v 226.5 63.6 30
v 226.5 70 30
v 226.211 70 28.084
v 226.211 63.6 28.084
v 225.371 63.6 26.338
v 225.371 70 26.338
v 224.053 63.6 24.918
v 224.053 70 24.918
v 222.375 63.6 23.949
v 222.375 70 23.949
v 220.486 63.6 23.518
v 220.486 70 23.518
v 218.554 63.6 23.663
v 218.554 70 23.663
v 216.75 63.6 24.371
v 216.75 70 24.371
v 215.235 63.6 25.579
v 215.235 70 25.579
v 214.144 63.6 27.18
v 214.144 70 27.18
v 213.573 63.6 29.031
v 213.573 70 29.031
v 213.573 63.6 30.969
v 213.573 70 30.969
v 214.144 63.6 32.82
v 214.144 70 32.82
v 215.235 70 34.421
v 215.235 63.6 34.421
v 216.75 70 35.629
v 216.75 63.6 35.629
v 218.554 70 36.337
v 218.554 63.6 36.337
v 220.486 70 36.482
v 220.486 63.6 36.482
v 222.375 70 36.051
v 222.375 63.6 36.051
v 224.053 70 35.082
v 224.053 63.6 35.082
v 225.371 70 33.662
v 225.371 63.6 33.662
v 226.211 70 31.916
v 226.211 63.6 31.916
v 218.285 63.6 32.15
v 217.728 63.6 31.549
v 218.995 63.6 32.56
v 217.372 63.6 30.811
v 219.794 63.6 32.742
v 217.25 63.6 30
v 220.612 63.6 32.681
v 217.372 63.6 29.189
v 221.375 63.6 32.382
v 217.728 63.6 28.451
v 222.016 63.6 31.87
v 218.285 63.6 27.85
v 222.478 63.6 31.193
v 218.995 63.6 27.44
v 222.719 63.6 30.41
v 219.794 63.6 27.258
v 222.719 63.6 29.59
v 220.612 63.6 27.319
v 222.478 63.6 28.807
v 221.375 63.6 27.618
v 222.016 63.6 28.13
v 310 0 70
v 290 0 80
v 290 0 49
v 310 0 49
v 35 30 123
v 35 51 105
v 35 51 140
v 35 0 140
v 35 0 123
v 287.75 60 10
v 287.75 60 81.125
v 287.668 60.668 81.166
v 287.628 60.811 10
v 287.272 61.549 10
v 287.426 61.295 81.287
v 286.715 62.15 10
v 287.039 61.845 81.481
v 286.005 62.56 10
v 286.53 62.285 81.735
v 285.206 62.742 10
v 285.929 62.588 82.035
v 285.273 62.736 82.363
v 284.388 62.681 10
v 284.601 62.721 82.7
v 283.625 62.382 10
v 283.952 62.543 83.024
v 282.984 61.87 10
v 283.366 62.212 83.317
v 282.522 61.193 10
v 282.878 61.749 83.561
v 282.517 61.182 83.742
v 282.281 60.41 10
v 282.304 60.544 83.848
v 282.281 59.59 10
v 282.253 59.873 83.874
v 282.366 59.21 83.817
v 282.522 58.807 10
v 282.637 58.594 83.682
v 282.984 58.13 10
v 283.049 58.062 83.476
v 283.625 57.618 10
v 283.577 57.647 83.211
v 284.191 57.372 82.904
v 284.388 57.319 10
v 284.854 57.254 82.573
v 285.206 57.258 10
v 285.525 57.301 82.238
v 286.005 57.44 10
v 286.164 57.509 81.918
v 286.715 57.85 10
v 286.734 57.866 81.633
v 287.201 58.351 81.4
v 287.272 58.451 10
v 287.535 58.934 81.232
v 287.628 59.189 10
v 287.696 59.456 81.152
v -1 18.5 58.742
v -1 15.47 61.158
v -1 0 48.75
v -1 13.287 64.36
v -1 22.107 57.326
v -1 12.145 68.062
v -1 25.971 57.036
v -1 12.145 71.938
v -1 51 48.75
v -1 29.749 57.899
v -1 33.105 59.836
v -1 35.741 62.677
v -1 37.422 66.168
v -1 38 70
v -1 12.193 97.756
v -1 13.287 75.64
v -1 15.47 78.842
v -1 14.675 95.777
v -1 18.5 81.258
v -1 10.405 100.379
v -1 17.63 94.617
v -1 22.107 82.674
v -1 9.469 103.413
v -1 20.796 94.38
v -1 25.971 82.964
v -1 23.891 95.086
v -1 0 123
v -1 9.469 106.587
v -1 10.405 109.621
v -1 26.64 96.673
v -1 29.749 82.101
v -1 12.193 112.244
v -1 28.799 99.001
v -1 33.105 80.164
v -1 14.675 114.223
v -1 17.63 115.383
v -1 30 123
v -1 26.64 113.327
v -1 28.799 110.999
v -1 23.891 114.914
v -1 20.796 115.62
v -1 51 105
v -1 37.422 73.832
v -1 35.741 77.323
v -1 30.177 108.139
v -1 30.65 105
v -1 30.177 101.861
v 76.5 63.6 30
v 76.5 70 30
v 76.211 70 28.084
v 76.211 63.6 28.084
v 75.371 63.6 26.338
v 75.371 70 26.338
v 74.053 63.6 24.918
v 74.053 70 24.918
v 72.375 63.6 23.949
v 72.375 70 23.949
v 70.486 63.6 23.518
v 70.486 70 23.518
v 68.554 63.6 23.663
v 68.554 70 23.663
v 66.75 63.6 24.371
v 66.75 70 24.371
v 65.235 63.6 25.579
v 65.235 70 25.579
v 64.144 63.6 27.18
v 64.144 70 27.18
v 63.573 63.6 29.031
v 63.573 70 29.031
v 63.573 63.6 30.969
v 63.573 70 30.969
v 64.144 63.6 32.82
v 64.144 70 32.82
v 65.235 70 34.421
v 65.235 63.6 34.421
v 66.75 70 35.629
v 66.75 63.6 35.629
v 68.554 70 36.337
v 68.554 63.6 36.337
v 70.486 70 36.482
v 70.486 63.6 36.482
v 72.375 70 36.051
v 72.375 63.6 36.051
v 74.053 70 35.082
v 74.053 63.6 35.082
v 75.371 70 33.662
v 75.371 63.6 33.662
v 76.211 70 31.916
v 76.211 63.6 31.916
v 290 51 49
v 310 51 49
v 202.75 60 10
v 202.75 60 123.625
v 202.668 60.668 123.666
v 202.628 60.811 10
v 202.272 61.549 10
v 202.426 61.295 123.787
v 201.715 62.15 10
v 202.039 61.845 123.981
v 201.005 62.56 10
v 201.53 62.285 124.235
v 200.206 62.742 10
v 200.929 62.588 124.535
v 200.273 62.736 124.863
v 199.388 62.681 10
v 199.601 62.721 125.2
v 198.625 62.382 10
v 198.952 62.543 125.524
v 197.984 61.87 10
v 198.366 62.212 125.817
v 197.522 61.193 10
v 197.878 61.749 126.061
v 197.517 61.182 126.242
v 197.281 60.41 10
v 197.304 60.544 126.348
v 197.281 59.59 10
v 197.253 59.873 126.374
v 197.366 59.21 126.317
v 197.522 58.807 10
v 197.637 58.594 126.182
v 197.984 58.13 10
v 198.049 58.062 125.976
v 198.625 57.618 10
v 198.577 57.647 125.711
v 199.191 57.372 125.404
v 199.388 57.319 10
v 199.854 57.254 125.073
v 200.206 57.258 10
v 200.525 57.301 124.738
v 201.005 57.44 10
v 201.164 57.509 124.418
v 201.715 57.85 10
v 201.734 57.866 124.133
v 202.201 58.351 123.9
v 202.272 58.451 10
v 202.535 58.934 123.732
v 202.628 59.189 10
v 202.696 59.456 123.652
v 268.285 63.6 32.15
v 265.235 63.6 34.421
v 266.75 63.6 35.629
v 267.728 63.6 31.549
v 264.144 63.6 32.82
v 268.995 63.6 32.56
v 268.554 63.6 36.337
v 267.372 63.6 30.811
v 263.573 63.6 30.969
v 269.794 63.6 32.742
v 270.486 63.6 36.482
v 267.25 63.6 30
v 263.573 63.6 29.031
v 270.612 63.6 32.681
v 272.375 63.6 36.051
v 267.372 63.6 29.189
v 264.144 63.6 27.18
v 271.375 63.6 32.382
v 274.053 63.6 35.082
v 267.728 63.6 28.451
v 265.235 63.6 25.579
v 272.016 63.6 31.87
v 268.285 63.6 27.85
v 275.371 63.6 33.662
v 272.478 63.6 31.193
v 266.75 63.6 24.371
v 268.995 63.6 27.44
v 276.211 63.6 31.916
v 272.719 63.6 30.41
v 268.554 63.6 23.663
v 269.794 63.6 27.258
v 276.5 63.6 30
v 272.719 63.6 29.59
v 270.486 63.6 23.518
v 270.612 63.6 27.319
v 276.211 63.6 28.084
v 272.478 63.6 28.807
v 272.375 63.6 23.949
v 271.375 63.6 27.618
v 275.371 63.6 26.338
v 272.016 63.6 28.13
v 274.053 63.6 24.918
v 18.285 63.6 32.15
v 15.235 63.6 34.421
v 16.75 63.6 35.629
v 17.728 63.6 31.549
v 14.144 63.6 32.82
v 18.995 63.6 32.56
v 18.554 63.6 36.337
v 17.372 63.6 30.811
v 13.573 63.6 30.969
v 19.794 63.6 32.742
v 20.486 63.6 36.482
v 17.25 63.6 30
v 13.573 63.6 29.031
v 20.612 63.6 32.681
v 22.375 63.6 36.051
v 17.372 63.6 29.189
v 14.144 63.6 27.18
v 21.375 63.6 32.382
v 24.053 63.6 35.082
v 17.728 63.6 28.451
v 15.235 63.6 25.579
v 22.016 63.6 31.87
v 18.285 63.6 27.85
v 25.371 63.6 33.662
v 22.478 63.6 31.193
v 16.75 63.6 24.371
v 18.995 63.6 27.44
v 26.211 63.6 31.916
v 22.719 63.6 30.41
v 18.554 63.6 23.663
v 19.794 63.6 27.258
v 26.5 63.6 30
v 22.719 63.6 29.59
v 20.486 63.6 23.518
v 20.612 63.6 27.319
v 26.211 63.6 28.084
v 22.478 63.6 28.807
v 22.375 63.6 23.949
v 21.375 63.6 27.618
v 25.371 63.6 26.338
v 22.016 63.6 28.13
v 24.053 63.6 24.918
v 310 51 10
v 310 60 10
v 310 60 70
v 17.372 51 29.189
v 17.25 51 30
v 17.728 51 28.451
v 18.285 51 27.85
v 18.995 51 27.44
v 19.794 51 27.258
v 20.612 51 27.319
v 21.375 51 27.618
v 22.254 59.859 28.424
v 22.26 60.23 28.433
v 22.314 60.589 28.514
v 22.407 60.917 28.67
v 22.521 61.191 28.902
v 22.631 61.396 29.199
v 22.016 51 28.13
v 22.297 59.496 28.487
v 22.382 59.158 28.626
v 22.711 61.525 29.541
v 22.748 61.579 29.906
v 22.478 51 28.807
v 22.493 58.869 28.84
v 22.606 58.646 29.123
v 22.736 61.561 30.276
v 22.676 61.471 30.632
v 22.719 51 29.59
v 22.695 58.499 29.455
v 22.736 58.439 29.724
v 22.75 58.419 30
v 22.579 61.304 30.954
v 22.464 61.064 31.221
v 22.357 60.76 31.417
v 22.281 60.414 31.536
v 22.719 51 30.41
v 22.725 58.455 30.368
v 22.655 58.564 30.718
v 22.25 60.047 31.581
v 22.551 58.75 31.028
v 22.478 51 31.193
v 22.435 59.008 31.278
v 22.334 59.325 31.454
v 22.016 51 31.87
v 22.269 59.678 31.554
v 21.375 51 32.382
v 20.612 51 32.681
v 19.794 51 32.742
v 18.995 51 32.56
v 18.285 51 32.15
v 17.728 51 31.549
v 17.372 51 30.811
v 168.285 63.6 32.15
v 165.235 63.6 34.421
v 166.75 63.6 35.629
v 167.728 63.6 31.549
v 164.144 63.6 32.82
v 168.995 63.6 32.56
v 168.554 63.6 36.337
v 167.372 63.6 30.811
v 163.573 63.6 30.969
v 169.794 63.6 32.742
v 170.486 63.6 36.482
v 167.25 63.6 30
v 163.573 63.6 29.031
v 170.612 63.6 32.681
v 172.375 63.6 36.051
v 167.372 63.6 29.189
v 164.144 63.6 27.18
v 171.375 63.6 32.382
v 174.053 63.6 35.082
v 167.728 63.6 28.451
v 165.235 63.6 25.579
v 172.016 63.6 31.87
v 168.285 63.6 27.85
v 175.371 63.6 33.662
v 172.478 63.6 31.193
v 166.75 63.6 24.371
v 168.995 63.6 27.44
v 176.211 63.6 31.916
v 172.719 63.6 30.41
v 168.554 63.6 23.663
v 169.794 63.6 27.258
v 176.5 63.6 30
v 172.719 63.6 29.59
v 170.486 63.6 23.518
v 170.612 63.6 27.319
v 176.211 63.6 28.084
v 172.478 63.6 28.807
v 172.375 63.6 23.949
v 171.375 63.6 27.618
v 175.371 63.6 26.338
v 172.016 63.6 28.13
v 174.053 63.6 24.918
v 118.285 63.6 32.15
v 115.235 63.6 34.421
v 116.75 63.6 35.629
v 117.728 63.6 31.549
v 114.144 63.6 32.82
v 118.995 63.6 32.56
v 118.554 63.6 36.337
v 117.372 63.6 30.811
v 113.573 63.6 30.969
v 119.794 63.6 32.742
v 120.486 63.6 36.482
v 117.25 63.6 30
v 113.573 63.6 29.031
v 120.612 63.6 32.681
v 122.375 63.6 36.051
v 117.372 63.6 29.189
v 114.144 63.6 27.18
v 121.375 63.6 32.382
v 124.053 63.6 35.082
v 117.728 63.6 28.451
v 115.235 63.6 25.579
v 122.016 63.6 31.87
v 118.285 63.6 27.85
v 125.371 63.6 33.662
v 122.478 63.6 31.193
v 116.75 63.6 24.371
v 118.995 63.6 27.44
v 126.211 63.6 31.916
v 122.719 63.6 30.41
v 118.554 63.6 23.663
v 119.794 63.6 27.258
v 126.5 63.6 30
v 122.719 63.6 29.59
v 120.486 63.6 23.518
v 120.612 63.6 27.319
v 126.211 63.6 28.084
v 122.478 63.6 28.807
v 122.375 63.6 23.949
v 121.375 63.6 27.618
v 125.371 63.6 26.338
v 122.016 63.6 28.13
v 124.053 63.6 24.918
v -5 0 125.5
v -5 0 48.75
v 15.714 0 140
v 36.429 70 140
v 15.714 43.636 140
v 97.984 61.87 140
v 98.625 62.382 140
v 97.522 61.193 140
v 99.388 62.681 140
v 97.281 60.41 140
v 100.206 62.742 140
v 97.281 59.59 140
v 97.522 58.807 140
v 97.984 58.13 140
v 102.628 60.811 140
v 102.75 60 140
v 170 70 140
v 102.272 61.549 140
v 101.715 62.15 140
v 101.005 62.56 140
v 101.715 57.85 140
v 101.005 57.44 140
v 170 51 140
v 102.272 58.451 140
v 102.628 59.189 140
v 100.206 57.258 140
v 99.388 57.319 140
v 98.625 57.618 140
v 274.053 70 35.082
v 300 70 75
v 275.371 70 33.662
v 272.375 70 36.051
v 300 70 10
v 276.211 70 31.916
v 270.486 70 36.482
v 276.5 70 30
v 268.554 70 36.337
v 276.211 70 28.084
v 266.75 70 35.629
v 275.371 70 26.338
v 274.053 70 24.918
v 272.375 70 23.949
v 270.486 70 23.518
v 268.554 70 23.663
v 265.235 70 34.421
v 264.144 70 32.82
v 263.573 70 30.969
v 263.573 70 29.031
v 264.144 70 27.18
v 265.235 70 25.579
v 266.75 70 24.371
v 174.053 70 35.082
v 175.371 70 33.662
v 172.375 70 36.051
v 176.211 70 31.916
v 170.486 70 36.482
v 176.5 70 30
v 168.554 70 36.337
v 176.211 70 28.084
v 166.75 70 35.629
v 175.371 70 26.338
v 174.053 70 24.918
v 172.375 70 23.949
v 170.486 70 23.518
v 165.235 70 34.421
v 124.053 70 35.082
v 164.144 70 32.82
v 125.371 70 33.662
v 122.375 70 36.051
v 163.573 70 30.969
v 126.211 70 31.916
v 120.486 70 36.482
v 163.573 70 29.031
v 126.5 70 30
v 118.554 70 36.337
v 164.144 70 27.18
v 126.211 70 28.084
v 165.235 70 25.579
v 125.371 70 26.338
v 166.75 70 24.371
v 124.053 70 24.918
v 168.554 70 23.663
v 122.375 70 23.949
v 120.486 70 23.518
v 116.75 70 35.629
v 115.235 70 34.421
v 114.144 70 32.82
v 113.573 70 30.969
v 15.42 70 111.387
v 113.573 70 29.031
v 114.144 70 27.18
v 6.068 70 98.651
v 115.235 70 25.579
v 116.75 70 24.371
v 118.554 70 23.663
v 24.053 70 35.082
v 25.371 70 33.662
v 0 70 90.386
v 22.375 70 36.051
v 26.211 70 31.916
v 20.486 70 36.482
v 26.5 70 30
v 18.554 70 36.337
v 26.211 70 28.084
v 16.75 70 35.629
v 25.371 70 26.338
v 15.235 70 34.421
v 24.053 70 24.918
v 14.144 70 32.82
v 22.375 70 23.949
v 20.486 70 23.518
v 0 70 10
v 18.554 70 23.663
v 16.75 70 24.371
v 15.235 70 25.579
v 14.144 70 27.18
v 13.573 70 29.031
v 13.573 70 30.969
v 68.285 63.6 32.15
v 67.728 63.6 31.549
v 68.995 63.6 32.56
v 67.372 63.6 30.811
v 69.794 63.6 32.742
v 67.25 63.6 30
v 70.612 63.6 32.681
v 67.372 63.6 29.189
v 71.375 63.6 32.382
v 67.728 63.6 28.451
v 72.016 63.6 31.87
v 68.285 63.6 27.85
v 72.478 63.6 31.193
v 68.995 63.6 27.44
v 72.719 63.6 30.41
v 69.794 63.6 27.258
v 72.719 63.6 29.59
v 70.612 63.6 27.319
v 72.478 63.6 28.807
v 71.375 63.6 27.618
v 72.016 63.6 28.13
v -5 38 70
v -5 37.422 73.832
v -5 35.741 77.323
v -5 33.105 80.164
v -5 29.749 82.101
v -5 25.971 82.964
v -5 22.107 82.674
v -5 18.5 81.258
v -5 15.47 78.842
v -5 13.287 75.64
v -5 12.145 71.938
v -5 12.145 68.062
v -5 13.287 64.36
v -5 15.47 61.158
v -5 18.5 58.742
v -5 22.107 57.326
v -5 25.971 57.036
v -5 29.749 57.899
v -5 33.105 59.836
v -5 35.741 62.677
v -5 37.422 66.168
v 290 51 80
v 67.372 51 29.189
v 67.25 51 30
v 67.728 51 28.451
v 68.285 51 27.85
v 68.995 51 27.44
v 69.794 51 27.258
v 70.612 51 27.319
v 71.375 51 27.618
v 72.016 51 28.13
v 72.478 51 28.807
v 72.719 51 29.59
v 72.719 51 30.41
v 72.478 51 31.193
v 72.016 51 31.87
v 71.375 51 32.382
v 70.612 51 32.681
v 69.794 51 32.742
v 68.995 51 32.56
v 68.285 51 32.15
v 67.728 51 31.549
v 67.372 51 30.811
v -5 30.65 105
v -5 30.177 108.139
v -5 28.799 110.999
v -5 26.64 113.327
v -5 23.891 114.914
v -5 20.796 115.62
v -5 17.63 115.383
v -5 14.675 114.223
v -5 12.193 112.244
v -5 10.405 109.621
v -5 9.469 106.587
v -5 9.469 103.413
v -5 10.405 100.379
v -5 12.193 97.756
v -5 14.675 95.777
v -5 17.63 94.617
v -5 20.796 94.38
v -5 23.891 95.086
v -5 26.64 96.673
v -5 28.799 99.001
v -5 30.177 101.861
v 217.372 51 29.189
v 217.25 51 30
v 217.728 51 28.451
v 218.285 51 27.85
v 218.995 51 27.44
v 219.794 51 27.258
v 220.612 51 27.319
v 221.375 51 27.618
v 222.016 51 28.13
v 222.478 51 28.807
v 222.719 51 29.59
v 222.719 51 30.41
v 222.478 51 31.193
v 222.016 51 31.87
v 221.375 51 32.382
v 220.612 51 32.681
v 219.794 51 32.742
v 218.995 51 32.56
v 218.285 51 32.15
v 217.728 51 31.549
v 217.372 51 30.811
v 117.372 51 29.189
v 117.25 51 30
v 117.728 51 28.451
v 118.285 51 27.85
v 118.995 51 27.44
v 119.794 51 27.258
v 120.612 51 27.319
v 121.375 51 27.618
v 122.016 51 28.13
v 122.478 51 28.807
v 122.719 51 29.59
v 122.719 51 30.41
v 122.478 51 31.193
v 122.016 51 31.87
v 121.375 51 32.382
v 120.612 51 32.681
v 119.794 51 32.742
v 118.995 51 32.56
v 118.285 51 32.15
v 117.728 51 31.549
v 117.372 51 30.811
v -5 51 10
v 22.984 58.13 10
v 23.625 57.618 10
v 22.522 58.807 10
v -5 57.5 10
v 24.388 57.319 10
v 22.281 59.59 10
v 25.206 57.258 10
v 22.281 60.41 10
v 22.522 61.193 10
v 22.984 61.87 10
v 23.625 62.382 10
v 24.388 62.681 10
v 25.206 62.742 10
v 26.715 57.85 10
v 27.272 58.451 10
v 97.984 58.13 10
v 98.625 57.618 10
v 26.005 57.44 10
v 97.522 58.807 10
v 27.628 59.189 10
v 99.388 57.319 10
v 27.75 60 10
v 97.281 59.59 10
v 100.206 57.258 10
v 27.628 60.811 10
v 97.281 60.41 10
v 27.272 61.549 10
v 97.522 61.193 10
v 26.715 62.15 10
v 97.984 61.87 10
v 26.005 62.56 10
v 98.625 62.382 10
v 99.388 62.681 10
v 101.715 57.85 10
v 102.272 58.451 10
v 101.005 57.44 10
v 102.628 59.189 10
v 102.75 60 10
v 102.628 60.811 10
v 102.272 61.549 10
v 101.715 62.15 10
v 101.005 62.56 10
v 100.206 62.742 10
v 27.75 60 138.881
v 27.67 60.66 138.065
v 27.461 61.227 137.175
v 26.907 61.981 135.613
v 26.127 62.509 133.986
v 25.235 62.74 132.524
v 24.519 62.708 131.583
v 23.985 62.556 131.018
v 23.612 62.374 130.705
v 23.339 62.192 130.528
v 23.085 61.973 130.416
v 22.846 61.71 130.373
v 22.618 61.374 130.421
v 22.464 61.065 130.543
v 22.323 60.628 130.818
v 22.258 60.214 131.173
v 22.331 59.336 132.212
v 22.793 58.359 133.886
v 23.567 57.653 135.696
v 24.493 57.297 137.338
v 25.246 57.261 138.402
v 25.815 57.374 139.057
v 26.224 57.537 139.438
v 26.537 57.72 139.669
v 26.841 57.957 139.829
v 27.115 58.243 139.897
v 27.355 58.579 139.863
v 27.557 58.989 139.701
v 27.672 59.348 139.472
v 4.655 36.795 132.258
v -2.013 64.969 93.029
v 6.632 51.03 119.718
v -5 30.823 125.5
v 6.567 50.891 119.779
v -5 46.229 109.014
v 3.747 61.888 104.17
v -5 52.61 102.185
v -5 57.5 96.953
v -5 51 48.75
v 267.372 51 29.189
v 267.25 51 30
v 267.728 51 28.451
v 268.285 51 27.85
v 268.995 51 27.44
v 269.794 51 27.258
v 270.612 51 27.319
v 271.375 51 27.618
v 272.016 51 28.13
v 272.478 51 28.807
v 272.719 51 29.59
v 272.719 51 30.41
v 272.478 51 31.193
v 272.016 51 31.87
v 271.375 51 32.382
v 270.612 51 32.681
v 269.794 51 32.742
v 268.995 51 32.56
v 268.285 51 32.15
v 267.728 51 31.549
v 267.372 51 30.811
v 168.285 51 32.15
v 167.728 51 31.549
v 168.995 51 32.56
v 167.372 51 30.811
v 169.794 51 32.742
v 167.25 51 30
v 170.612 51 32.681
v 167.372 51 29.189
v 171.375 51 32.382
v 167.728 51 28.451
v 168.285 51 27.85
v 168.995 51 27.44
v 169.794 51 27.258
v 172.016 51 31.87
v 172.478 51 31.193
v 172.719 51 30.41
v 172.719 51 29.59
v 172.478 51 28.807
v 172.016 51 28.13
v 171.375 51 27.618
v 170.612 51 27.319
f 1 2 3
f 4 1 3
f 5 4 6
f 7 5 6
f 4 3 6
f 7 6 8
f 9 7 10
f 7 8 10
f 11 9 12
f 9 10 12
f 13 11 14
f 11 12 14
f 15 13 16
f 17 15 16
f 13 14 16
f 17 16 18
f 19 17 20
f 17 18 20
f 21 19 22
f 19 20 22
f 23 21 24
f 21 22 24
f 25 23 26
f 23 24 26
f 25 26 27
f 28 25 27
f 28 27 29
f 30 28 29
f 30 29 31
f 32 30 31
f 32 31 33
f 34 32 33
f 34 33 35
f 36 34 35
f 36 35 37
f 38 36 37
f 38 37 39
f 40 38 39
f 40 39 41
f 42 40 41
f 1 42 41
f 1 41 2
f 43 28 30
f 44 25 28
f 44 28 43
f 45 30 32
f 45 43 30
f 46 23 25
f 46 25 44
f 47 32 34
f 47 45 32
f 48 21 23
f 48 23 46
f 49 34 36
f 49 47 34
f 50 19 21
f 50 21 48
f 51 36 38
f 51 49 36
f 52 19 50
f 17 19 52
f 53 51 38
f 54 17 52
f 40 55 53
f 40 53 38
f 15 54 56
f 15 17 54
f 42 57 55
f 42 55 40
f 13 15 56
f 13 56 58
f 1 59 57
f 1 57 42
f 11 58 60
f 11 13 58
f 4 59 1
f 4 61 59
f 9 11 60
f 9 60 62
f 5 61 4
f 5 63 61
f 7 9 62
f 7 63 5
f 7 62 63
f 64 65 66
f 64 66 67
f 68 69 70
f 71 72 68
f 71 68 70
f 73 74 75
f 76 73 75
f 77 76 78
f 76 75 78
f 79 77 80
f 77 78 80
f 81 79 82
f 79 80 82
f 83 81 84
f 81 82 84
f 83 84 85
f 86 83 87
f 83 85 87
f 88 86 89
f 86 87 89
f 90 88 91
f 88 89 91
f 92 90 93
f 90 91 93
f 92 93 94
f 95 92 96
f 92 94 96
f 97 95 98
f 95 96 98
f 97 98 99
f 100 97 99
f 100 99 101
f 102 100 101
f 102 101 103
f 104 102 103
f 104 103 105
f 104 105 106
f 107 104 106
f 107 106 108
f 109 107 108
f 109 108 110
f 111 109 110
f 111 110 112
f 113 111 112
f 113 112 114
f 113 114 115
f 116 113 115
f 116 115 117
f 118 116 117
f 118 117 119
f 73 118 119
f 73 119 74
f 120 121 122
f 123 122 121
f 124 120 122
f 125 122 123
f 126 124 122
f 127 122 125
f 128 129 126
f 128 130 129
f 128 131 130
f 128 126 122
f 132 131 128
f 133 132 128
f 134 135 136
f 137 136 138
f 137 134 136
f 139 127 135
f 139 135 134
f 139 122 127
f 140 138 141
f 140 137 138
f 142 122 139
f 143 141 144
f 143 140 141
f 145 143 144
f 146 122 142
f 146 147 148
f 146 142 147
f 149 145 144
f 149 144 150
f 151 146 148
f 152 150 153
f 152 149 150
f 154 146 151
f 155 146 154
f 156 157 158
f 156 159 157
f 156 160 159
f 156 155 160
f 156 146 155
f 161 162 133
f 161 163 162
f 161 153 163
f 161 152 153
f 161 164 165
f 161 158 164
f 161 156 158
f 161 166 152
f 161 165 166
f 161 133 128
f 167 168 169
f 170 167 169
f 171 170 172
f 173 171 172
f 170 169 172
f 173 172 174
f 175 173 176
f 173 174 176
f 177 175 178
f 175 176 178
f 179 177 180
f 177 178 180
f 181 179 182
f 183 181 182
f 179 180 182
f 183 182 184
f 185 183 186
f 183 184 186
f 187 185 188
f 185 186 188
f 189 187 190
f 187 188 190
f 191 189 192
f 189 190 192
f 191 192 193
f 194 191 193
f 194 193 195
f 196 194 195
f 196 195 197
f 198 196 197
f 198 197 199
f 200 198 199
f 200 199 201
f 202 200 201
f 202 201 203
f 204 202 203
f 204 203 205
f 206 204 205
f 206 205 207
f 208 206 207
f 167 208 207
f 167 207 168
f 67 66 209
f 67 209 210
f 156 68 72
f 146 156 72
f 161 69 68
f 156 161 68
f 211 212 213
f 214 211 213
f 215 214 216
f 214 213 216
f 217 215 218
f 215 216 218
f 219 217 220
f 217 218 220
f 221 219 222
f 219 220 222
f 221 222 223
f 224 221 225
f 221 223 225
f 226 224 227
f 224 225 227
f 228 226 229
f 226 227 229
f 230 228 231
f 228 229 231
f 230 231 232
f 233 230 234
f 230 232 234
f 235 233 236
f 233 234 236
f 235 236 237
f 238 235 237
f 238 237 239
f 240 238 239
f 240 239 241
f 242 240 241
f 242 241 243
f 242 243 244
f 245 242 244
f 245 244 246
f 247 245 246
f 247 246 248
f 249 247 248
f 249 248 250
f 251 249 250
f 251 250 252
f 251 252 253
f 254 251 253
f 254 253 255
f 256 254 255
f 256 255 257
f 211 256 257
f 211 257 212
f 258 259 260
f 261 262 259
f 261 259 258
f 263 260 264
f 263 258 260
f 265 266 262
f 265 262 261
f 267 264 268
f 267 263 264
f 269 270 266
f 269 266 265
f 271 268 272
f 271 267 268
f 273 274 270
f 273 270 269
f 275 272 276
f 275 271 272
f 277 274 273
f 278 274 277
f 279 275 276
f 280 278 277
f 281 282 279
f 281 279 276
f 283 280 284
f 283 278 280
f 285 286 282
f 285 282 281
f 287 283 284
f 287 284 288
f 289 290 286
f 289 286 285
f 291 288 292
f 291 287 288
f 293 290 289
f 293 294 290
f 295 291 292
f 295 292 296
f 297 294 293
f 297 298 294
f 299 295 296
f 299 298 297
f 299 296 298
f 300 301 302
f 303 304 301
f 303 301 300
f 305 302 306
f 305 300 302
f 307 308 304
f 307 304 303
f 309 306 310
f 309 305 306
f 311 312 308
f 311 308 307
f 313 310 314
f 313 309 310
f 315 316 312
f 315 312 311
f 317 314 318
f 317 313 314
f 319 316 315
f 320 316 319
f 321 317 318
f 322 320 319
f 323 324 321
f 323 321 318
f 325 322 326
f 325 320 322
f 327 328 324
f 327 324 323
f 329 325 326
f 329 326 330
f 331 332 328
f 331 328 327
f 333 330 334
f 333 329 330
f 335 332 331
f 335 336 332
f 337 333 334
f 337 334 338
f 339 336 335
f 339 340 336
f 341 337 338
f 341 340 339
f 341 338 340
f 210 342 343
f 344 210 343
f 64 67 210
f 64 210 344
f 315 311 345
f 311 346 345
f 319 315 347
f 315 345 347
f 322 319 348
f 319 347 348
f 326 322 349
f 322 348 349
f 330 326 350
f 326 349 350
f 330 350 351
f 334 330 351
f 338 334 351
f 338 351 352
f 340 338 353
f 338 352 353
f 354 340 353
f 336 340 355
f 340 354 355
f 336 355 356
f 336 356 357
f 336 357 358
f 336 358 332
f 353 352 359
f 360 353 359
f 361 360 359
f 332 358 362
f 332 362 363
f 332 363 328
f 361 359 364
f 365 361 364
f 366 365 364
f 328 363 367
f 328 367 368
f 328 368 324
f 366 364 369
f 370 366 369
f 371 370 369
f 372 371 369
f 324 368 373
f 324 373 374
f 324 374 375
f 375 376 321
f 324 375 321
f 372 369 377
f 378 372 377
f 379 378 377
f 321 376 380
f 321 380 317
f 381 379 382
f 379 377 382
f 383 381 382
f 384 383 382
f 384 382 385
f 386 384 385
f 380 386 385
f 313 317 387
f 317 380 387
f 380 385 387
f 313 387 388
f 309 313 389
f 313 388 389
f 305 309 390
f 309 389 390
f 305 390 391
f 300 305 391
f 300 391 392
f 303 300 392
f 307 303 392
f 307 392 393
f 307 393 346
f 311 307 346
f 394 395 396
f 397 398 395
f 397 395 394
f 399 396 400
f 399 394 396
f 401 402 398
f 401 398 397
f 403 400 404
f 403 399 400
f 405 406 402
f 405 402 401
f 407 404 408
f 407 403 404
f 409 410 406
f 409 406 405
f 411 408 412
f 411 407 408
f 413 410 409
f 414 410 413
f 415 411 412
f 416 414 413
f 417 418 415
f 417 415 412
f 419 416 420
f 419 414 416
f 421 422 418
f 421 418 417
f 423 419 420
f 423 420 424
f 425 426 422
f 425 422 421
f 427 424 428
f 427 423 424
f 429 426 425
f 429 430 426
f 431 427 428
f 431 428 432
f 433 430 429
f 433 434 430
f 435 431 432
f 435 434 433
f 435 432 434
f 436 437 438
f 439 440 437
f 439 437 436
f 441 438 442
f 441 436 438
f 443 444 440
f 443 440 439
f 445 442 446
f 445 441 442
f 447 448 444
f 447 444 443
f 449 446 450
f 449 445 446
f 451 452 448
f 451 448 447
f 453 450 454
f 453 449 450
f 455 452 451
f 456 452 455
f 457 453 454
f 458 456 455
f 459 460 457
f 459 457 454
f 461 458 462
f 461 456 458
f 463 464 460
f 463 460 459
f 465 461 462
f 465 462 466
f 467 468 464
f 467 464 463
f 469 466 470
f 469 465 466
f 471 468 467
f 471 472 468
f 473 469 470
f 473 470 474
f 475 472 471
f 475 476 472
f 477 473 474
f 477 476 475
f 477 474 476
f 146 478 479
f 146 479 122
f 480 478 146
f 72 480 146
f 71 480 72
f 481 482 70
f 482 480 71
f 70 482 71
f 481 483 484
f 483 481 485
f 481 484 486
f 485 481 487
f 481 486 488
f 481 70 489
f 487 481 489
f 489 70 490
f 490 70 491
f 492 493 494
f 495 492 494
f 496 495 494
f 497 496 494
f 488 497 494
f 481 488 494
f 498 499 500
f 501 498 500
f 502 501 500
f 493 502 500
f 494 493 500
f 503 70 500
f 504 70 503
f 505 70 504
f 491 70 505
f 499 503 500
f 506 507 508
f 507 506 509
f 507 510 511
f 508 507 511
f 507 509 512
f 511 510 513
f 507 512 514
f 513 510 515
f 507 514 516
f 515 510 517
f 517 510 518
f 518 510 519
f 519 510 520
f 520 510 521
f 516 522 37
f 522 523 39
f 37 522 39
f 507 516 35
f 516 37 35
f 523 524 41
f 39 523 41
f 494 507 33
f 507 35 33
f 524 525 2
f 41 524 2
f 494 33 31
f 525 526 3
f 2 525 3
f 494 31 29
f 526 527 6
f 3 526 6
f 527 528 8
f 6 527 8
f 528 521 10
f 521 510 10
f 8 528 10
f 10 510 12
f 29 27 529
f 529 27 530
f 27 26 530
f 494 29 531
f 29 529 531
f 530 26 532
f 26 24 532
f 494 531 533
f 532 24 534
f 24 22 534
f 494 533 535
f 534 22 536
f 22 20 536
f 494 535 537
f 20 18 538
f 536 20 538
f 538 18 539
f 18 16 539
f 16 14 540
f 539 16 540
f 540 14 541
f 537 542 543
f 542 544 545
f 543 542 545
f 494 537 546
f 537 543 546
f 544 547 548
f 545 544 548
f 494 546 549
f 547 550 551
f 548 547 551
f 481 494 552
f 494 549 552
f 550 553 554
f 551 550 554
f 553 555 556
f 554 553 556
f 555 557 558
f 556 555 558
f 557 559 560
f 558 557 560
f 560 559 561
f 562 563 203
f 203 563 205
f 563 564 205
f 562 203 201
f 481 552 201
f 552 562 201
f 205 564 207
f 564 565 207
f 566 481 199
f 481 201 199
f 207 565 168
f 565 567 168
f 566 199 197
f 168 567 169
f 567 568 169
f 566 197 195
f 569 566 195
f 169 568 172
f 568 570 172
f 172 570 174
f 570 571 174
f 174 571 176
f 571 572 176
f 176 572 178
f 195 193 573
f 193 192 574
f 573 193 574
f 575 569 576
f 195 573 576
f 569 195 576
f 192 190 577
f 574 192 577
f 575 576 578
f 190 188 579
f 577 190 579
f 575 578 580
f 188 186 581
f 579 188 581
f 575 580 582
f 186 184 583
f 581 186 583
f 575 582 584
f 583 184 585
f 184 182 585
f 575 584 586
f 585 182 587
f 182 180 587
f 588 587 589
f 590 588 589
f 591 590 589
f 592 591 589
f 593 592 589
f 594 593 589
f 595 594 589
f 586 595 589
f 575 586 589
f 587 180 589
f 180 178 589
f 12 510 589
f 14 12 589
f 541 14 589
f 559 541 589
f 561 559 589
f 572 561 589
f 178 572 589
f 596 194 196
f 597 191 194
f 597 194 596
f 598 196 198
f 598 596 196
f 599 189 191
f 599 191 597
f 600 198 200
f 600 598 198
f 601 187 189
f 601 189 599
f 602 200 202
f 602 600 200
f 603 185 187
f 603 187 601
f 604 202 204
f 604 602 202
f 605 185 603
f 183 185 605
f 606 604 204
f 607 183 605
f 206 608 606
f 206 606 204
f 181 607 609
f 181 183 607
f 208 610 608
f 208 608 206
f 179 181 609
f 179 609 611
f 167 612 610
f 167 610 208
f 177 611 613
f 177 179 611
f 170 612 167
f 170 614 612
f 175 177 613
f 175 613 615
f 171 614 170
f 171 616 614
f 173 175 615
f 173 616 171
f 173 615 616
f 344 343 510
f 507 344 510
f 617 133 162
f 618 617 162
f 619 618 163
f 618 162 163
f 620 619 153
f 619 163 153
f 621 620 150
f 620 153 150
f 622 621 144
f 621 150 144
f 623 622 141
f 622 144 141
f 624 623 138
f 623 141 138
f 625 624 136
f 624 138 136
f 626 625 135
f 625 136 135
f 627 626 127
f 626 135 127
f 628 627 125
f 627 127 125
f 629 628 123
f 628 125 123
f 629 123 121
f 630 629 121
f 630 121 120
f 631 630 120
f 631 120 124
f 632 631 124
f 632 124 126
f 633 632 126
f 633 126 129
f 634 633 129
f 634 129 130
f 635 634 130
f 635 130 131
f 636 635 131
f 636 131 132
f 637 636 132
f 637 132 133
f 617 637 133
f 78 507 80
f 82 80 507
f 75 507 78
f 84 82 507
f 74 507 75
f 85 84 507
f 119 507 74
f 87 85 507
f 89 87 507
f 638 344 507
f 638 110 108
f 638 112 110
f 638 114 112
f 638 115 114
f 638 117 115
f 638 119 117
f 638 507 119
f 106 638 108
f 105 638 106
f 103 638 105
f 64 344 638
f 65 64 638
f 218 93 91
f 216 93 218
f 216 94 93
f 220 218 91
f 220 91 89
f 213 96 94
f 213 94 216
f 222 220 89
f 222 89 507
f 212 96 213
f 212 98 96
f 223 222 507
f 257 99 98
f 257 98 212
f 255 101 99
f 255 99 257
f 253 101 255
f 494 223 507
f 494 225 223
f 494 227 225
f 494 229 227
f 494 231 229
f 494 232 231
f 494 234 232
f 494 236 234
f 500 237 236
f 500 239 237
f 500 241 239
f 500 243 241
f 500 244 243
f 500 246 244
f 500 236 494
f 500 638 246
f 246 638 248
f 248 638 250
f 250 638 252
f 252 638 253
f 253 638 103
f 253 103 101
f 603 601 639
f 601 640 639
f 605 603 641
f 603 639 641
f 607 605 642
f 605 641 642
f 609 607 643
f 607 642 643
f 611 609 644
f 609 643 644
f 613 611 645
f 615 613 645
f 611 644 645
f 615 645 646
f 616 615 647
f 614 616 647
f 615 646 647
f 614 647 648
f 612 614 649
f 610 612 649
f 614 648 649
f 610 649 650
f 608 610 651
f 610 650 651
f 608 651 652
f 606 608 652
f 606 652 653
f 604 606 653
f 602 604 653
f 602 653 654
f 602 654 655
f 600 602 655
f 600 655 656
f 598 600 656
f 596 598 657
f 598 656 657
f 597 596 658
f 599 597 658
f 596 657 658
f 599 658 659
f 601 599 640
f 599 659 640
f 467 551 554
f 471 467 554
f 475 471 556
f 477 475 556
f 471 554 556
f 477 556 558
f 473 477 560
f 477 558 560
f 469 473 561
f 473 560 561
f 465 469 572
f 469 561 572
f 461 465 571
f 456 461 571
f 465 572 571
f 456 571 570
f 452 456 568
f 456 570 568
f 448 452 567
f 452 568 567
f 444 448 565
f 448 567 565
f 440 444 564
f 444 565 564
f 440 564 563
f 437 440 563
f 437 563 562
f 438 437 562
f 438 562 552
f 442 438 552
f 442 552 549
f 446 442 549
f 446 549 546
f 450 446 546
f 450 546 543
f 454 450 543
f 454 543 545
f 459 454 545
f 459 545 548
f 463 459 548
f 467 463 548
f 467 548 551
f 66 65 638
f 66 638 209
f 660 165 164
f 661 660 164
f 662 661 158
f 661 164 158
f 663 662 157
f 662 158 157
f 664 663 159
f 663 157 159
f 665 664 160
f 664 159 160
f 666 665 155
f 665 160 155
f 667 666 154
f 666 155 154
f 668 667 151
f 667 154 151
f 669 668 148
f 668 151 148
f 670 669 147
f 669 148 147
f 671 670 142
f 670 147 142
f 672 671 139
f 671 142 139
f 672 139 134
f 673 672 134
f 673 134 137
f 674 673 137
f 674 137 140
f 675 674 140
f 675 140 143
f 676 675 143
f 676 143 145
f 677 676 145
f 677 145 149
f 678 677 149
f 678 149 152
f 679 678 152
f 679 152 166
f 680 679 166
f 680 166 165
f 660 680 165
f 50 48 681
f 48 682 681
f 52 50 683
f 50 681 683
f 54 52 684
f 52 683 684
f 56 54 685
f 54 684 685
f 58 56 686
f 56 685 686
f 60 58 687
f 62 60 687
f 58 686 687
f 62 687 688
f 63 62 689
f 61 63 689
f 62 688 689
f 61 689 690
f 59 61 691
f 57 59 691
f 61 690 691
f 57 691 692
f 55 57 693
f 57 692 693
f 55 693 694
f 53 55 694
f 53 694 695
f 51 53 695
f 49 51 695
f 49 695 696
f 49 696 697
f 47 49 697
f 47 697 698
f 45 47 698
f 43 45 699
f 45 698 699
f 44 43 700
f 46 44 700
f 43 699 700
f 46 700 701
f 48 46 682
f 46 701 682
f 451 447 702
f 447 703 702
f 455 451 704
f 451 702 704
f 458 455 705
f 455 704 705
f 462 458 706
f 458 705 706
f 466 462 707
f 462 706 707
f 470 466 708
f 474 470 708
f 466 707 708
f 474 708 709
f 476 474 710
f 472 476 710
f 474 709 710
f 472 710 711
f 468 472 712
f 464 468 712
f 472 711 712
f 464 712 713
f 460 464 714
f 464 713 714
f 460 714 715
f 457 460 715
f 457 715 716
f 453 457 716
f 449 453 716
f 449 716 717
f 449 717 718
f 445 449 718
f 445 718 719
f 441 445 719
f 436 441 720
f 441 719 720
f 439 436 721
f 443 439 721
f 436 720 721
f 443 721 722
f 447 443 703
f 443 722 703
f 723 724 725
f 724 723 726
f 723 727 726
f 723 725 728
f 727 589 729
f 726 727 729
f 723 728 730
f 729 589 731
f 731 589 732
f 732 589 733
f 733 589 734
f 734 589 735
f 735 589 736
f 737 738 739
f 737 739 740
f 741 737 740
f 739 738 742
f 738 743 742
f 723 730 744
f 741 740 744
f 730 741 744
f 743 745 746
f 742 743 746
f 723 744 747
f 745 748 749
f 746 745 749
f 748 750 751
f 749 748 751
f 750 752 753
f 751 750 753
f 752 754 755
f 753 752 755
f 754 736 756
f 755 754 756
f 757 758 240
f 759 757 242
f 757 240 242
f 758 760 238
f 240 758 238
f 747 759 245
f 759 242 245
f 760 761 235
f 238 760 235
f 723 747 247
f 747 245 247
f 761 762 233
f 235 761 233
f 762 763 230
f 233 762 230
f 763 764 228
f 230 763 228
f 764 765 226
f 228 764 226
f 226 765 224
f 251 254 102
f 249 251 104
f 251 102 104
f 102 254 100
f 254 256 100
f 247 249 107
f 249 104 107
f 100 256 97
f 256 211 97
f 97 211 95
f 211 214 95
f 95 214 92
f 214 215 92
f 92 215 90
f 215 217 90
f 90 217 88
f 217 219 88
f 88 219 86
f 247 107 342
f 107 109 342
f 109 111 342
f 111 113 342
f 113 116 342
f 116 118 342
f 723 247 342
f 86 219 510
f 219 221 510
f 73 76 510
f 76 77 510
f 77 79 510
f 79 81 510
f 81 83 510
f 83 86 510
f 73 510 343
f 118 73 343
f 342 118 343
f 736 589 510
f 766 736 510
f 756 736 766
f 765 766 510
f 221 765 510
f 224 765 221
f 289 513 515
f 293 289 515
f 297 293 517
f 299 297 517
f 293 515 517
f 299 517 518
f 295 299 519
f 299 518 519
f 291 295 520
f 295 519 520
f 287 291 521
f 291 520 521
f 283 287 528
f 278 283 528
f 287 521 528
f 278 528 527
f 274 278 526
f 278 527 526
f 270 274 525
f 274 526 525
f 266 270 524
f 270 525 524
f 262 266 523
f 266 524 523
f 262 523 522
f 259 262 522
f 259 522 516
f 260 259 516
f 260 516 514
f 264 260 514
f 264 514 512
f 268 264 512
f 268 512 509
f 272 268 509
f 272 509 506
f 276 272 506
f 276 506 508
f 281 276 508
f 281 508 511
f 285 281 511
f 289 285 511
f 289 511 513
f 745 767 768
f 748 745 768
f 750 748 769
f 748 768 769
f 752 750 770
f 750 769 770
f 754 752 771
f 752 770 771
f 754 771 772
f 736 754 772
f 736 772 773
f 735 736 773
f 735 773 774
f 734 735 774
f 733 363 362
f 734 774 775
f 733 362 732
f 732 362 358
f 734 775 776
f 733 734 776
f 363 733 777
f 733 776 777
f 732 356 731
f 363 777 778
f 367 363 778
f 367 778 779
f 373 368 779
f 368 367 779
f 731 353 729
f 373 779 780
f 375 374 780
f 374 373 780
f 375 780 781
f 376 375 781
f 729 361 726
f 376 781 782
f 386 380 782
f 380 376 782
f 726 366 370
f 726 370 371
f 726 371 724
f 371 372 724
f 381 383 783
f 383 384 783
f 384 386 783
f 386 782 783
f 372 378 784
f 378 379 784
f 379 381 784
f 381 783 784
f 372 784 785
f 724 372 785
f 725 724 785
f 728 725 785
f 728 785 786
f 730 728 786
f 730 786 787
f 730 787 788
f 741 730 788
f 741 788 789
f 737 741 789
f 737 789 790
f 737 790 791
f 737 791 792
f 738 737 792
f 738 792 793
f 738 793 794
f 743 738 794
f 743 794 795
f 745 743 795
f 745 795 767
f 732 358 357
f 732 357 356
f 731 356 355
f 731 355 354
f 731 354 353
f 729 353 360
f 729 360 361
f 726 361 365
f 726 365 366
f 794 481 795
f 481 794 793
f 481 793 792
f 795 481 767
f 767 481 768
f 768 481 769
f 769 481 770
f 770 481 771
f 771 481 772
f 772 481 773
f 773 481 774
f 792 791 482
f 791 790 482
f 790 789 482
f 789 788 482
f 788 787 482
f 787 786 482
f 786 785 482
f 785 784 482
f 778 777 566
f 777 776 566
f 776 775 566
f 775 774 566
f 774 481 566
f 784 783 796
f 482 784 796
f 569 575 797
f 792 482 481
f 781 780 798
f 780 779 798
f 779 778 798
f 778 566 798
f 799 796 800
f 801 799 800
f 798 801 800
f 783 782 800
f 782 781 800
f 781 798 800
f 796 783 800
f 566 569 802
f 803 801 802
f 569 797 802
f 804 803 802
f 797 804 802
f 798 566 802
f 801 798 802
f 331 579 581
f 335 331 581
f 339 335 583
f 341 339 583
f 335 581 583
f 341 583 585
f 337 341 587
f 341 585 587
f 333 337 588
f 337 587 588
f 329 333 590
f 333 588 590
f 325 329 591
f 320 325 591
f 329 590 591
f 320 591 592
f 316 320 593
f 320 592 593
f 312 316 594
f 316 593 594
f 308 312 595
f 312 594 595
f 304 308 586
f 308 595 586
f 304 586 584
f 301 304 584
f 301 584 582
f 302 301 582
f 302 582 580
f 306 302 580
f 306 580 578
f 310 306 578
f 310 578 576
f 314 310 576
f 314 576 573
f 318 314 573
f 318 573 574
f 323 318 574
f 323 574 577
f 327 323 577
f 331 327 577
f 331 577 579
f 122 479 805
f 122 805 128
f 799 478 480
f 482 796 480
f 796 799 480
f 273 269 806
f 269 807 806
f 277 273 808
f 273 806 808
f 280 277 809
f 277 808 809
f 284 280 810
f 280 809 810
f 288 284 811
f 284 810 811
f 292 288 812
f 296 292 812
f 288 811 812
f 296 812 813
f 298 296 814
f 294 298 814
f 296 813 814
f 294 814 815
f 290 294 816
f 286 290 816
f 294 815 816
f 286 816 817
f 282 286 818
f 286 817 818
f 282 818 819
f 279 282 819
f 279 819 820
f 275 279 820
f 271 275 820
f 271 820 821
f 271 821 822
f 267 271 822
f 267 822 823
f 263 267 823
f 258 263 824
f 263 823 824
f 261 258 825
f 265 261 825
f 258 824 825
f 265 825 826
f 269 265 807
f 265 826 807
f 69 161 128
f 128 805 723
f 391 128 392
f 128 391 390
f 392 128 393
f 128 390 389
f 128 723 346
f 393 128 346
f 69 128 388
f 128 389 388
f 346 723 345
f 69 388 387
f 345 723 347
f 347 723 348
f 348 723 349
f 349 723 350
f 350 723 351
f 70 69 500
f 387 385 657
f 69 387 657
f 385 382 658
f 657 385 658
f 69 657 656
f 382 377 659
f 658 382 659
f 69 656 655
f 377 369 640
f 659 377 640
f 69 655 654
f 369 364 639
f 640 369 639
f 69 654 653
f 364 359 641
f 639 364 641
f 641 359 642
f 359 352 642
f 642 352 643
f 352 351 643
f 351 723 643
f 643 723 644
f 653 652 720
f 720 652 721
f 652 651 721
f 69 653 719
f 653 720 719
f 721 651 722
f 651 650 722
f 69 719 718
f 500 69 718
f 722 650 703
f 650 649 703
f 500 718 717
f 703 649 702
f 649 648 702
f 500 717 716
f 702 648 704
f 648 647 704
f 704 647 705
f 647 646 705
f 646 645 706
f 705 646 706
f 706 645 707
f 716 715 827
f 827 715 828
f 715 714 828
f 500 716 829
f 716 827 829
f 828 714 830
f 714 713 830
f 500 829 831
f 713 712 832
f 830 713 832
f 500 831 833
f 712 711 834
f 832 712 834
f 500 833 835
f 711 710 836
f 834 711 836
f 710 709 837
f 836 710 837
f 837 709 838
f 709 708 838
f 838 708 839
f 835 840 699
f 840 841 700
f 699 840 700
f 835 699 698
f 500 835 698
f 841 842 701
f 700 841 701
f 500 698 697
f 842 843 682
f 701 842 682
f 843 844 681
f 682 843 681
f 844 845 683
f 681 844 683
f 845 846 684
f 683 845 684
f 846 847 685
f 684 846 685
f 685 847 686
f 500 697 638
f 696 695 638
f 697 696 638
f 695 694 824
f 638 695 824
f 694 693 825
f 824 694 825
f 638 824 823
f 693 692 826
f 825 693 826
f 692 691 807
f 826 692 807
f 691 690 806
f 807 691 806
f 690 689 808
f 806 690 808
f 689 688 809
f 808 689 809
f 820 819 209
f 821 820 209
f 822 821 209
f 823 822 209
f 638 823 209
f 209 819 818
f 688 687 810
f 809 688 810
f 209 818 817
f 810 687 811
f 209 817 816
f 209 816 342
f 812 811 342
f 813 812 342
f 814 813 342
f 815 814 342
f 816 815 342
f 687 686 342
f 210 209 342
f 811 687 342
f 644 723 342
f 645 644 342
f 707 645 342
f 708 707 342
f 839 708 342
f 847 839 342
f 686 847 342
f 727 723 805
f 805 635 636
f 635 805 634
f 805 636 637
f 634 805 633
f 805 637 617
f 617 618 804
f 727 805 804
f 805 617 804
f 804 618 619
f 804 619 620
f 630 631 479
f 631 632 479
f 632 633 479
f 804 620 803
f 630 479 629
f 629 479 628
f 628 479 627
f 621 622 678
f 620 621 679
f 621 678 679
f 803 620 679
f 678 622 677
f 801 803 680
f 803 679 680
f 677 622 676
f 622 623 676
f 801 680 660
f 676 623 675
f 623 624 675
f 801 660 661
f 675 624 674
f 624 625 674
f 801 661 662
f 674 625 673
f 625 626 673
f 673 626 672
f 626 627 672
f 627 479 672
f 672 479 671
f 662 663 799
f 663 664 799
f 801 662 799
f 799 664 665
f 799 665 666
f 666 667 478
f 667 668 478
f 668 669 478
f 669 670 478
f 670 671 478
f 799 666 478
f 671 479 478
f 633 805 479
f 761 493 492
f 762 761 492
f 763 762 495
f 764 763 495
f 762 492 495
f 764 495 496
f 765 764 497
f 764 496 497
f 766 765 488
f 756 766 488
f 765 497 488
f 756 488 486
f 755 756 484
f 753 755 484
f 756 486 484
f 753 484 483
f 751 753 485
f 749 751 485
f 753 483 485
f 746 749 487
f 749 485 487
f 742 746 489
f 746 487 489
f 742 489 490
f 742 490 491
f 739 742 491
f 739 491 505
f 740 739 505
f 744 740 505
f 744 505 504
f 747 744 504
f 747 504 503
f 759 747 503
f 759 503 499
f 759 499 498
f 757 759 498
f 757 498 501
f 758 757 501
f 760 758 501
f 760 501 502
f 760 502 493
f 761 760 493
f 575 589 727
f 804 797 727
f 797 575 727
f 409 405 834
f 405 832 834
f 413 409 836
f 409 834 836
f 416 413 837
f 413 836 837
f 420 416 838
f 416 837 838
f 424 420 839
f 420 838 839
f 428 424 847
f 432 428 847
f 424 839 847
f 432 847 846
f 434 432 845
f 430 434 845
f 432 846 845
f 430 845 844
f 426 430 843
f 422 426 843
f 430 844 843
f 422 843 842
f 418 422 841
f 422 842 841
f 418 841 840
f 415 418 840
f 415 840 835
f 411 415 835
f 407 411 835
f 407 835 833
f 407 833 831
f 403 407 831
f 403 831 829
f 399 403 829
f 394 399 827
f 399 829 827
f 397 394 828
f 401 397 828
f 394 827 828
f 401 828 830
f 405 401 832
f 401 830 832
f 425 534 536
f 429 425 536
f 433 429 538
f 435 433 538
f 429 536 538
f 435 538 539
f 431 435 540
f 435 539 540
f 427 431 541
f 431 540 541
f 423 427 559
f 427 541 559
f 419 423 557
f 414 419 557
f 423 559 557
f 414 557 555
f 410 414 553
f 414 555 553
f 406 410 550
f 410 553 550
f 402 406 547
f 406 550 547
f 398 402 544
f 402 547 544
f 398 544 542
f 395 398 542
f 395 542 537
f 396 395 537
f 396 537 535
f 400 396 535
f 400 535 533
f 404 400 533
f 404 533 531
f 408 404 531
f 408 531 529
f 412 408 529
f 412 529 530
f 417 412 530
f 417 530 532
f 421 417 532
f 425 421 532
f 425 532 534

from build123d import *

# Parameters (mm, degrees)
PAD001_DEPTH        = 130
POCKET_DEPTH        = 77
SKETCH003_R         = 2.75
HOLE_DEPTH          = 150.001
HOLE001_D           = 5.5
HOLE001_DEPTH       = 25
HOLE001_CBORE_D     = 13
HOLE001_CBORE_DEPTH = 6.4
SKETCH012_W         = 40
SKETCH012_H         = 91.25
PAD004_DEPTH        = 52
POCKET003_DEPTH     = 54
POCKET003_TAPER     = 30
POCKET004_DEPTH     = 36
PAD006_DEPTH        = 52
SKETCH028_R         = 10.65
SKETCH028_R_2       = 13
POCKET009_DEPTH     = 5
POCKET011_DEPTH     = 102


with BuildPart() as part:
    # Sketch001 → Pad001 (new body)
    with BuildSketch(Plane.XY):
        Polygon((300, 70), (0, 70), (-5, 57.5), (-5, 51), (310, 51), (310, 60), align=None)
    extrude(amount=PAD001_DEPTH)

    # Sketch002 → Pocket (cut)
    with BuildSketch(Plane.XZ):
        Polygon((310, 60), (130, 150), (310, 150), align=None)
    extrude(amount=-POCKET_DEPTH, mode=Mode.SUBTRACT)

    # Sketch003 → Hole (cut, through all)
    with BuildSketch(Plane.XY.offset(150)):
        with Locations((100, 60)):
            Circle(SKETCH003_R)
        with Locations((200, 60)):
            Circle(SKETCH003_R)
        with Locations((285, 60)):
            Circle(SKETCH003_R)
        with Locations((25, 60)):
            Circle(SKETCH003_R)
    extrude(amount=-HOLE_DEPTH, mode=Mode.SUBTRACT)

    # Hole001
    with Locations(Plane(origin=(0, 70, 0), x_dir=(1, 0, 0), z_dir=(0, 1, 0))):
        with Locations((20, -20), (70, -20), (120, -20), (170, -20), (220, -20), (270, -20)):
            CounterBoreHole(HOLE001_D / 2, HOLE001_CBORE_D / 2, HOLE001_CBORE_DEPTH, depth=HOLE001_DEPTH)

    # Sketch012 → Pad004 (join)
    with BuildSketch(Plane.XZ):
        with Locations((15, 84.375)):
            Rectangle(SKETCH012_W, SKETCH012_H)
    extrude(amount=-PAD004_DEPTH)

    # Sketch014 → Pocket003 (cut)
    with BuildSketch(Plane.XY.offset(130)):
        Polygon((-50, -40), (-50, 100), (60, 100), align=None)
    extrude(amount=-POCKET003_DEPTH, taper=POCKET003_TAPER, mode=Mode.SUBTRACT)

    # Sketch016 → Pocket004 (cut)
    with BuildSketch(Plane.YZ.offset(35)):
        Polygon((0, 113), (0, 29), (51, 29), (51, 95), (30, 113), align=None)
    extrude(amount=-POCKET004_DEPTH, mode=Mode.SUBTRACT)

    # Sketch018 → Pad006 (join)
    with BuildSketch(Plane.XZ):
        Polygon((290, 70), (290, 39), (310, 39), (310, 60), align=None)
    extrude(amount=-PAD006_DEPTH)

    # Sketch028 → Pocket009 (cut)
    with BuildSketch(Plane.YZ):
        with Locations((20, 95)):
            Circle(SKETCH028_R)
        with Locations((25, 60)):
            Circle(SKETCH028_R_2)
    extrude(amount=-POCKET009_DEPTH, mode=Mode.SUBTRACT)

    # Sketch136 → Pocket011 (cut)
    with BuildSketch(Plane.XZ):
        Polygon((-20, 140), (-20, 105), (30, 140), align=None)
    extrude(amount=-POCKET011_DEPTH, mode=Mode.SUBTRACT)


with BuildPart() as part_1:
    # Body001 placement: moved
    add(part.part.moved(Location((0, 0, 10))))


solid = part_1.part
